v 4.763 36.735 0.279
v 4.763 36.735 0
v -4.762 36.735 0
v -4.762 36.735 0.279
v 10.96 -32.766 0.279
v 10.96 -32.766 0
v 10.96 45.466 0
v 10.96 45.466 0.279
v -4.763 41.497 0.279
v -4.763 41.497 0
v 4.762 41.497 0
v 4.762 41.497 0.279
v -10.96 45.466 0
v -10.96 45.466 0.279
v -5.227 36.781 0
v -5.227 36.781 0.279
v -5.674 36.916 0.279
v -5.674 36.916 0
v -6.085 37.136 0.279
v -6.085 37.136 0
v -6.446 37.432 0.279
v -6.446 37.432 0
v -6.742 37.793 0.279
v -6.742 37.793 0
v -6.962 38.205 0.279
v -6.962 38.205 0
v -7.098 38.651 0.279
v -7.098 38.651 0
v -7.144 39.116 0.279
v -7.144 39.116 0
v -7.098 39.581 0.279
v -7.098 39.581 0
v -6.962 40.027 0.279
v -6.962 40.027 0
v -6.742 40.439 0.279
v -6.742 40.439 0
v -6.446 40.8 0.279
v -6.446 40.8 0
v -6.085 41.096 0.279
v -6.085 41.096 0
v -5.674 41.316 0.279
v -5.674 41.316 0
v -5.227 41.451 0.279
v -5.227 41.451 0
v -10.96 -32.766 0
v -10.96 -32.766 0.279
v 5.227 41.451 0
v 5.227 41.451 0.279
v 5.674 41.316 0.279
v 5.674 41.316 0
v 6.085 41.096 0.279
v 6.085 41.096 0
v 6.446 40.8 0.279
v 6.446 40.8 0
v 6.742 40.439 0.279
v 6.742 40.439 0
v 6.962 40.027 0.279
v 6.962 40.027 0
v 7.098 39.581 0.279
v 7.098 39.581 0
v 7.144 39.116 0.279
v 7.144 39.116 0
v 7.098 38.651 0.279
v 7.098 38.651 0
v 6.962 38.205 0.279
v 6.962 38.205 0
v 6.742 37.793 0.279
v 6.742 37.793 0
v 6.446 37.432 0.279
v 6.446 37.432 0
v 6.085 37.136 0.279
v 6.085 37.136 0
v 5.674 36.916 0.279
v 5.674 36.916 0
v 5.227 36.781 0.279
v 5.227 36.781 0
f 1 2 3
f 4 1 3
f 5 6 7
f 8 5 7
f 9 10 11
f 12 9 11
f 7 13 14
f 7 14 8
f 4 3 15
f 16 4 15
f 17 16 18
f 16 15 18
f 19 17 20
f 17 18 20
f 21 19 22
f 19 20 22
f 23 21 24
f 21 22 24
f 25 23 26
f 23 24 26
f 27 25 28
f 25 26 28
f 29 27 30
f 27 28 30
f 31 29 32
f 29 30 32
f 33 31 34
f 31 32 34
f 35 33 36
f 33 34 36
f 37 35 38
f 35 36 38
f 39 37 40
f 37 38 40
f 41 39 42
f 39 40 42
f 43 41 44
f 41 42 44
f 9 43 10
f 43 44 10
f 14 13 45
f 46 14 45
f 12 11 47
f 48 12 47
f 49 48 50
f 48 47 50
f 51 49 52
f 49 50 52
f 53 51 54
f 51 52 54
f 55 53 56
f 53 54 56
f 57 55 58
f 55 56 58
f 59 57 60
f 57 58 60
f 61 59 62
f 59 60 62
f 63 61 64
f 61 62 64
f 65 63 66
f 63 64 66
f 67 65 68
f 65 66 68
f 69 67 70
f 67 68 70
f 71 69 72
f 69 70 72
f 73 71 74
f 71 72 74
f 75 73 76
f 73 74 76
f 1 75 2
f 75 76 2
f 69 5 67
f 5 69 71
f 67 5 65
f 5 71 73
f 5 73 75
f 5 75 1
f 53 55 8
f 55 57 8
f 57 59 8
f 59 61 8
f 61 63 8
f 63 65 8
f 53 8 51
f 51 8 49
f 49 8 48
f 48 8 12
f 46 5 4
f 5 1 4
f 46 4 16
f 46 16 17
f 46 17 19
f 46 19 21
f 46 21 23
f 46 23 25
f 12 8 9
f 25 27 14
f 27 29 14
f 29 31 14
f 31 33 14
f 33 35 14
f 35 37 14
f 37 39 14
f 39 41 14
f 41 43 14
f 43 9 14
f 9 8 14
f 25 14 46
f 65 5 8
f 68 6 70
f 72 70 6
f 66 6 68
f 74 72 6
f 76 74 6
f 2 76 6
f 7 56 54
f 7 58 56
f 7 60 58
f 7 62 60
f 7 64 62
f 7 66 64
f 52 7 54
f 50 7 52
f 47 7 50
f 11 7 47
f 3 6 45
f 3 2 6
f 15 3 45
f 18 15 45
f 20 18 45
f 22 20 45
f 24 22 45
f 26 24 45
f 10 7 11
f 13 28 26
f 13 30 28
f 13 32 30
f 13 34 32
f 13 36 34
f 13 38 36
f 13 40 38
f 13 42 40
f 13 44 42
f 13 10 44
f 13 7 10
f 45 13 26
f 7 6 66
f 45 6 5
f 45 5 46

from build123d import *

# Parameters (mm, degrees)
BOSS_EXTRUDE1_DEPTH = 0.2794


with BuildPart() as part:
    # Sketch1 → Boss-Extrude1 (new body)
    with BuildSketch(Plane.XY):
        Polygon((-10.9601, 32.766), (-10.9601, 45.466), (10.9601, 45.466), (10.9601, 32.766), (10.9601, -32.766), (-10.9601, -32.766), align=None)
        with BuildLine():
            Line((4.7625, 36.73475), (-4.7625, 36.73475))
            ThreePointArc((-4.7625, 36.73475), (-7.14375, 39.116), (-4.7625, 41.49725))
            Line((-4.7625, 41.49725), (4.7625, 41.49725))
            ThreePointArc((4.7625, 41.49725), (7.14375, 39.116), (4.7625, 36.73475))
        make_face(mode=Mode.SUBTRACT)
    extrude(amount=BOSS_EXTRUDE1_DEPTH)


solid = part.part
